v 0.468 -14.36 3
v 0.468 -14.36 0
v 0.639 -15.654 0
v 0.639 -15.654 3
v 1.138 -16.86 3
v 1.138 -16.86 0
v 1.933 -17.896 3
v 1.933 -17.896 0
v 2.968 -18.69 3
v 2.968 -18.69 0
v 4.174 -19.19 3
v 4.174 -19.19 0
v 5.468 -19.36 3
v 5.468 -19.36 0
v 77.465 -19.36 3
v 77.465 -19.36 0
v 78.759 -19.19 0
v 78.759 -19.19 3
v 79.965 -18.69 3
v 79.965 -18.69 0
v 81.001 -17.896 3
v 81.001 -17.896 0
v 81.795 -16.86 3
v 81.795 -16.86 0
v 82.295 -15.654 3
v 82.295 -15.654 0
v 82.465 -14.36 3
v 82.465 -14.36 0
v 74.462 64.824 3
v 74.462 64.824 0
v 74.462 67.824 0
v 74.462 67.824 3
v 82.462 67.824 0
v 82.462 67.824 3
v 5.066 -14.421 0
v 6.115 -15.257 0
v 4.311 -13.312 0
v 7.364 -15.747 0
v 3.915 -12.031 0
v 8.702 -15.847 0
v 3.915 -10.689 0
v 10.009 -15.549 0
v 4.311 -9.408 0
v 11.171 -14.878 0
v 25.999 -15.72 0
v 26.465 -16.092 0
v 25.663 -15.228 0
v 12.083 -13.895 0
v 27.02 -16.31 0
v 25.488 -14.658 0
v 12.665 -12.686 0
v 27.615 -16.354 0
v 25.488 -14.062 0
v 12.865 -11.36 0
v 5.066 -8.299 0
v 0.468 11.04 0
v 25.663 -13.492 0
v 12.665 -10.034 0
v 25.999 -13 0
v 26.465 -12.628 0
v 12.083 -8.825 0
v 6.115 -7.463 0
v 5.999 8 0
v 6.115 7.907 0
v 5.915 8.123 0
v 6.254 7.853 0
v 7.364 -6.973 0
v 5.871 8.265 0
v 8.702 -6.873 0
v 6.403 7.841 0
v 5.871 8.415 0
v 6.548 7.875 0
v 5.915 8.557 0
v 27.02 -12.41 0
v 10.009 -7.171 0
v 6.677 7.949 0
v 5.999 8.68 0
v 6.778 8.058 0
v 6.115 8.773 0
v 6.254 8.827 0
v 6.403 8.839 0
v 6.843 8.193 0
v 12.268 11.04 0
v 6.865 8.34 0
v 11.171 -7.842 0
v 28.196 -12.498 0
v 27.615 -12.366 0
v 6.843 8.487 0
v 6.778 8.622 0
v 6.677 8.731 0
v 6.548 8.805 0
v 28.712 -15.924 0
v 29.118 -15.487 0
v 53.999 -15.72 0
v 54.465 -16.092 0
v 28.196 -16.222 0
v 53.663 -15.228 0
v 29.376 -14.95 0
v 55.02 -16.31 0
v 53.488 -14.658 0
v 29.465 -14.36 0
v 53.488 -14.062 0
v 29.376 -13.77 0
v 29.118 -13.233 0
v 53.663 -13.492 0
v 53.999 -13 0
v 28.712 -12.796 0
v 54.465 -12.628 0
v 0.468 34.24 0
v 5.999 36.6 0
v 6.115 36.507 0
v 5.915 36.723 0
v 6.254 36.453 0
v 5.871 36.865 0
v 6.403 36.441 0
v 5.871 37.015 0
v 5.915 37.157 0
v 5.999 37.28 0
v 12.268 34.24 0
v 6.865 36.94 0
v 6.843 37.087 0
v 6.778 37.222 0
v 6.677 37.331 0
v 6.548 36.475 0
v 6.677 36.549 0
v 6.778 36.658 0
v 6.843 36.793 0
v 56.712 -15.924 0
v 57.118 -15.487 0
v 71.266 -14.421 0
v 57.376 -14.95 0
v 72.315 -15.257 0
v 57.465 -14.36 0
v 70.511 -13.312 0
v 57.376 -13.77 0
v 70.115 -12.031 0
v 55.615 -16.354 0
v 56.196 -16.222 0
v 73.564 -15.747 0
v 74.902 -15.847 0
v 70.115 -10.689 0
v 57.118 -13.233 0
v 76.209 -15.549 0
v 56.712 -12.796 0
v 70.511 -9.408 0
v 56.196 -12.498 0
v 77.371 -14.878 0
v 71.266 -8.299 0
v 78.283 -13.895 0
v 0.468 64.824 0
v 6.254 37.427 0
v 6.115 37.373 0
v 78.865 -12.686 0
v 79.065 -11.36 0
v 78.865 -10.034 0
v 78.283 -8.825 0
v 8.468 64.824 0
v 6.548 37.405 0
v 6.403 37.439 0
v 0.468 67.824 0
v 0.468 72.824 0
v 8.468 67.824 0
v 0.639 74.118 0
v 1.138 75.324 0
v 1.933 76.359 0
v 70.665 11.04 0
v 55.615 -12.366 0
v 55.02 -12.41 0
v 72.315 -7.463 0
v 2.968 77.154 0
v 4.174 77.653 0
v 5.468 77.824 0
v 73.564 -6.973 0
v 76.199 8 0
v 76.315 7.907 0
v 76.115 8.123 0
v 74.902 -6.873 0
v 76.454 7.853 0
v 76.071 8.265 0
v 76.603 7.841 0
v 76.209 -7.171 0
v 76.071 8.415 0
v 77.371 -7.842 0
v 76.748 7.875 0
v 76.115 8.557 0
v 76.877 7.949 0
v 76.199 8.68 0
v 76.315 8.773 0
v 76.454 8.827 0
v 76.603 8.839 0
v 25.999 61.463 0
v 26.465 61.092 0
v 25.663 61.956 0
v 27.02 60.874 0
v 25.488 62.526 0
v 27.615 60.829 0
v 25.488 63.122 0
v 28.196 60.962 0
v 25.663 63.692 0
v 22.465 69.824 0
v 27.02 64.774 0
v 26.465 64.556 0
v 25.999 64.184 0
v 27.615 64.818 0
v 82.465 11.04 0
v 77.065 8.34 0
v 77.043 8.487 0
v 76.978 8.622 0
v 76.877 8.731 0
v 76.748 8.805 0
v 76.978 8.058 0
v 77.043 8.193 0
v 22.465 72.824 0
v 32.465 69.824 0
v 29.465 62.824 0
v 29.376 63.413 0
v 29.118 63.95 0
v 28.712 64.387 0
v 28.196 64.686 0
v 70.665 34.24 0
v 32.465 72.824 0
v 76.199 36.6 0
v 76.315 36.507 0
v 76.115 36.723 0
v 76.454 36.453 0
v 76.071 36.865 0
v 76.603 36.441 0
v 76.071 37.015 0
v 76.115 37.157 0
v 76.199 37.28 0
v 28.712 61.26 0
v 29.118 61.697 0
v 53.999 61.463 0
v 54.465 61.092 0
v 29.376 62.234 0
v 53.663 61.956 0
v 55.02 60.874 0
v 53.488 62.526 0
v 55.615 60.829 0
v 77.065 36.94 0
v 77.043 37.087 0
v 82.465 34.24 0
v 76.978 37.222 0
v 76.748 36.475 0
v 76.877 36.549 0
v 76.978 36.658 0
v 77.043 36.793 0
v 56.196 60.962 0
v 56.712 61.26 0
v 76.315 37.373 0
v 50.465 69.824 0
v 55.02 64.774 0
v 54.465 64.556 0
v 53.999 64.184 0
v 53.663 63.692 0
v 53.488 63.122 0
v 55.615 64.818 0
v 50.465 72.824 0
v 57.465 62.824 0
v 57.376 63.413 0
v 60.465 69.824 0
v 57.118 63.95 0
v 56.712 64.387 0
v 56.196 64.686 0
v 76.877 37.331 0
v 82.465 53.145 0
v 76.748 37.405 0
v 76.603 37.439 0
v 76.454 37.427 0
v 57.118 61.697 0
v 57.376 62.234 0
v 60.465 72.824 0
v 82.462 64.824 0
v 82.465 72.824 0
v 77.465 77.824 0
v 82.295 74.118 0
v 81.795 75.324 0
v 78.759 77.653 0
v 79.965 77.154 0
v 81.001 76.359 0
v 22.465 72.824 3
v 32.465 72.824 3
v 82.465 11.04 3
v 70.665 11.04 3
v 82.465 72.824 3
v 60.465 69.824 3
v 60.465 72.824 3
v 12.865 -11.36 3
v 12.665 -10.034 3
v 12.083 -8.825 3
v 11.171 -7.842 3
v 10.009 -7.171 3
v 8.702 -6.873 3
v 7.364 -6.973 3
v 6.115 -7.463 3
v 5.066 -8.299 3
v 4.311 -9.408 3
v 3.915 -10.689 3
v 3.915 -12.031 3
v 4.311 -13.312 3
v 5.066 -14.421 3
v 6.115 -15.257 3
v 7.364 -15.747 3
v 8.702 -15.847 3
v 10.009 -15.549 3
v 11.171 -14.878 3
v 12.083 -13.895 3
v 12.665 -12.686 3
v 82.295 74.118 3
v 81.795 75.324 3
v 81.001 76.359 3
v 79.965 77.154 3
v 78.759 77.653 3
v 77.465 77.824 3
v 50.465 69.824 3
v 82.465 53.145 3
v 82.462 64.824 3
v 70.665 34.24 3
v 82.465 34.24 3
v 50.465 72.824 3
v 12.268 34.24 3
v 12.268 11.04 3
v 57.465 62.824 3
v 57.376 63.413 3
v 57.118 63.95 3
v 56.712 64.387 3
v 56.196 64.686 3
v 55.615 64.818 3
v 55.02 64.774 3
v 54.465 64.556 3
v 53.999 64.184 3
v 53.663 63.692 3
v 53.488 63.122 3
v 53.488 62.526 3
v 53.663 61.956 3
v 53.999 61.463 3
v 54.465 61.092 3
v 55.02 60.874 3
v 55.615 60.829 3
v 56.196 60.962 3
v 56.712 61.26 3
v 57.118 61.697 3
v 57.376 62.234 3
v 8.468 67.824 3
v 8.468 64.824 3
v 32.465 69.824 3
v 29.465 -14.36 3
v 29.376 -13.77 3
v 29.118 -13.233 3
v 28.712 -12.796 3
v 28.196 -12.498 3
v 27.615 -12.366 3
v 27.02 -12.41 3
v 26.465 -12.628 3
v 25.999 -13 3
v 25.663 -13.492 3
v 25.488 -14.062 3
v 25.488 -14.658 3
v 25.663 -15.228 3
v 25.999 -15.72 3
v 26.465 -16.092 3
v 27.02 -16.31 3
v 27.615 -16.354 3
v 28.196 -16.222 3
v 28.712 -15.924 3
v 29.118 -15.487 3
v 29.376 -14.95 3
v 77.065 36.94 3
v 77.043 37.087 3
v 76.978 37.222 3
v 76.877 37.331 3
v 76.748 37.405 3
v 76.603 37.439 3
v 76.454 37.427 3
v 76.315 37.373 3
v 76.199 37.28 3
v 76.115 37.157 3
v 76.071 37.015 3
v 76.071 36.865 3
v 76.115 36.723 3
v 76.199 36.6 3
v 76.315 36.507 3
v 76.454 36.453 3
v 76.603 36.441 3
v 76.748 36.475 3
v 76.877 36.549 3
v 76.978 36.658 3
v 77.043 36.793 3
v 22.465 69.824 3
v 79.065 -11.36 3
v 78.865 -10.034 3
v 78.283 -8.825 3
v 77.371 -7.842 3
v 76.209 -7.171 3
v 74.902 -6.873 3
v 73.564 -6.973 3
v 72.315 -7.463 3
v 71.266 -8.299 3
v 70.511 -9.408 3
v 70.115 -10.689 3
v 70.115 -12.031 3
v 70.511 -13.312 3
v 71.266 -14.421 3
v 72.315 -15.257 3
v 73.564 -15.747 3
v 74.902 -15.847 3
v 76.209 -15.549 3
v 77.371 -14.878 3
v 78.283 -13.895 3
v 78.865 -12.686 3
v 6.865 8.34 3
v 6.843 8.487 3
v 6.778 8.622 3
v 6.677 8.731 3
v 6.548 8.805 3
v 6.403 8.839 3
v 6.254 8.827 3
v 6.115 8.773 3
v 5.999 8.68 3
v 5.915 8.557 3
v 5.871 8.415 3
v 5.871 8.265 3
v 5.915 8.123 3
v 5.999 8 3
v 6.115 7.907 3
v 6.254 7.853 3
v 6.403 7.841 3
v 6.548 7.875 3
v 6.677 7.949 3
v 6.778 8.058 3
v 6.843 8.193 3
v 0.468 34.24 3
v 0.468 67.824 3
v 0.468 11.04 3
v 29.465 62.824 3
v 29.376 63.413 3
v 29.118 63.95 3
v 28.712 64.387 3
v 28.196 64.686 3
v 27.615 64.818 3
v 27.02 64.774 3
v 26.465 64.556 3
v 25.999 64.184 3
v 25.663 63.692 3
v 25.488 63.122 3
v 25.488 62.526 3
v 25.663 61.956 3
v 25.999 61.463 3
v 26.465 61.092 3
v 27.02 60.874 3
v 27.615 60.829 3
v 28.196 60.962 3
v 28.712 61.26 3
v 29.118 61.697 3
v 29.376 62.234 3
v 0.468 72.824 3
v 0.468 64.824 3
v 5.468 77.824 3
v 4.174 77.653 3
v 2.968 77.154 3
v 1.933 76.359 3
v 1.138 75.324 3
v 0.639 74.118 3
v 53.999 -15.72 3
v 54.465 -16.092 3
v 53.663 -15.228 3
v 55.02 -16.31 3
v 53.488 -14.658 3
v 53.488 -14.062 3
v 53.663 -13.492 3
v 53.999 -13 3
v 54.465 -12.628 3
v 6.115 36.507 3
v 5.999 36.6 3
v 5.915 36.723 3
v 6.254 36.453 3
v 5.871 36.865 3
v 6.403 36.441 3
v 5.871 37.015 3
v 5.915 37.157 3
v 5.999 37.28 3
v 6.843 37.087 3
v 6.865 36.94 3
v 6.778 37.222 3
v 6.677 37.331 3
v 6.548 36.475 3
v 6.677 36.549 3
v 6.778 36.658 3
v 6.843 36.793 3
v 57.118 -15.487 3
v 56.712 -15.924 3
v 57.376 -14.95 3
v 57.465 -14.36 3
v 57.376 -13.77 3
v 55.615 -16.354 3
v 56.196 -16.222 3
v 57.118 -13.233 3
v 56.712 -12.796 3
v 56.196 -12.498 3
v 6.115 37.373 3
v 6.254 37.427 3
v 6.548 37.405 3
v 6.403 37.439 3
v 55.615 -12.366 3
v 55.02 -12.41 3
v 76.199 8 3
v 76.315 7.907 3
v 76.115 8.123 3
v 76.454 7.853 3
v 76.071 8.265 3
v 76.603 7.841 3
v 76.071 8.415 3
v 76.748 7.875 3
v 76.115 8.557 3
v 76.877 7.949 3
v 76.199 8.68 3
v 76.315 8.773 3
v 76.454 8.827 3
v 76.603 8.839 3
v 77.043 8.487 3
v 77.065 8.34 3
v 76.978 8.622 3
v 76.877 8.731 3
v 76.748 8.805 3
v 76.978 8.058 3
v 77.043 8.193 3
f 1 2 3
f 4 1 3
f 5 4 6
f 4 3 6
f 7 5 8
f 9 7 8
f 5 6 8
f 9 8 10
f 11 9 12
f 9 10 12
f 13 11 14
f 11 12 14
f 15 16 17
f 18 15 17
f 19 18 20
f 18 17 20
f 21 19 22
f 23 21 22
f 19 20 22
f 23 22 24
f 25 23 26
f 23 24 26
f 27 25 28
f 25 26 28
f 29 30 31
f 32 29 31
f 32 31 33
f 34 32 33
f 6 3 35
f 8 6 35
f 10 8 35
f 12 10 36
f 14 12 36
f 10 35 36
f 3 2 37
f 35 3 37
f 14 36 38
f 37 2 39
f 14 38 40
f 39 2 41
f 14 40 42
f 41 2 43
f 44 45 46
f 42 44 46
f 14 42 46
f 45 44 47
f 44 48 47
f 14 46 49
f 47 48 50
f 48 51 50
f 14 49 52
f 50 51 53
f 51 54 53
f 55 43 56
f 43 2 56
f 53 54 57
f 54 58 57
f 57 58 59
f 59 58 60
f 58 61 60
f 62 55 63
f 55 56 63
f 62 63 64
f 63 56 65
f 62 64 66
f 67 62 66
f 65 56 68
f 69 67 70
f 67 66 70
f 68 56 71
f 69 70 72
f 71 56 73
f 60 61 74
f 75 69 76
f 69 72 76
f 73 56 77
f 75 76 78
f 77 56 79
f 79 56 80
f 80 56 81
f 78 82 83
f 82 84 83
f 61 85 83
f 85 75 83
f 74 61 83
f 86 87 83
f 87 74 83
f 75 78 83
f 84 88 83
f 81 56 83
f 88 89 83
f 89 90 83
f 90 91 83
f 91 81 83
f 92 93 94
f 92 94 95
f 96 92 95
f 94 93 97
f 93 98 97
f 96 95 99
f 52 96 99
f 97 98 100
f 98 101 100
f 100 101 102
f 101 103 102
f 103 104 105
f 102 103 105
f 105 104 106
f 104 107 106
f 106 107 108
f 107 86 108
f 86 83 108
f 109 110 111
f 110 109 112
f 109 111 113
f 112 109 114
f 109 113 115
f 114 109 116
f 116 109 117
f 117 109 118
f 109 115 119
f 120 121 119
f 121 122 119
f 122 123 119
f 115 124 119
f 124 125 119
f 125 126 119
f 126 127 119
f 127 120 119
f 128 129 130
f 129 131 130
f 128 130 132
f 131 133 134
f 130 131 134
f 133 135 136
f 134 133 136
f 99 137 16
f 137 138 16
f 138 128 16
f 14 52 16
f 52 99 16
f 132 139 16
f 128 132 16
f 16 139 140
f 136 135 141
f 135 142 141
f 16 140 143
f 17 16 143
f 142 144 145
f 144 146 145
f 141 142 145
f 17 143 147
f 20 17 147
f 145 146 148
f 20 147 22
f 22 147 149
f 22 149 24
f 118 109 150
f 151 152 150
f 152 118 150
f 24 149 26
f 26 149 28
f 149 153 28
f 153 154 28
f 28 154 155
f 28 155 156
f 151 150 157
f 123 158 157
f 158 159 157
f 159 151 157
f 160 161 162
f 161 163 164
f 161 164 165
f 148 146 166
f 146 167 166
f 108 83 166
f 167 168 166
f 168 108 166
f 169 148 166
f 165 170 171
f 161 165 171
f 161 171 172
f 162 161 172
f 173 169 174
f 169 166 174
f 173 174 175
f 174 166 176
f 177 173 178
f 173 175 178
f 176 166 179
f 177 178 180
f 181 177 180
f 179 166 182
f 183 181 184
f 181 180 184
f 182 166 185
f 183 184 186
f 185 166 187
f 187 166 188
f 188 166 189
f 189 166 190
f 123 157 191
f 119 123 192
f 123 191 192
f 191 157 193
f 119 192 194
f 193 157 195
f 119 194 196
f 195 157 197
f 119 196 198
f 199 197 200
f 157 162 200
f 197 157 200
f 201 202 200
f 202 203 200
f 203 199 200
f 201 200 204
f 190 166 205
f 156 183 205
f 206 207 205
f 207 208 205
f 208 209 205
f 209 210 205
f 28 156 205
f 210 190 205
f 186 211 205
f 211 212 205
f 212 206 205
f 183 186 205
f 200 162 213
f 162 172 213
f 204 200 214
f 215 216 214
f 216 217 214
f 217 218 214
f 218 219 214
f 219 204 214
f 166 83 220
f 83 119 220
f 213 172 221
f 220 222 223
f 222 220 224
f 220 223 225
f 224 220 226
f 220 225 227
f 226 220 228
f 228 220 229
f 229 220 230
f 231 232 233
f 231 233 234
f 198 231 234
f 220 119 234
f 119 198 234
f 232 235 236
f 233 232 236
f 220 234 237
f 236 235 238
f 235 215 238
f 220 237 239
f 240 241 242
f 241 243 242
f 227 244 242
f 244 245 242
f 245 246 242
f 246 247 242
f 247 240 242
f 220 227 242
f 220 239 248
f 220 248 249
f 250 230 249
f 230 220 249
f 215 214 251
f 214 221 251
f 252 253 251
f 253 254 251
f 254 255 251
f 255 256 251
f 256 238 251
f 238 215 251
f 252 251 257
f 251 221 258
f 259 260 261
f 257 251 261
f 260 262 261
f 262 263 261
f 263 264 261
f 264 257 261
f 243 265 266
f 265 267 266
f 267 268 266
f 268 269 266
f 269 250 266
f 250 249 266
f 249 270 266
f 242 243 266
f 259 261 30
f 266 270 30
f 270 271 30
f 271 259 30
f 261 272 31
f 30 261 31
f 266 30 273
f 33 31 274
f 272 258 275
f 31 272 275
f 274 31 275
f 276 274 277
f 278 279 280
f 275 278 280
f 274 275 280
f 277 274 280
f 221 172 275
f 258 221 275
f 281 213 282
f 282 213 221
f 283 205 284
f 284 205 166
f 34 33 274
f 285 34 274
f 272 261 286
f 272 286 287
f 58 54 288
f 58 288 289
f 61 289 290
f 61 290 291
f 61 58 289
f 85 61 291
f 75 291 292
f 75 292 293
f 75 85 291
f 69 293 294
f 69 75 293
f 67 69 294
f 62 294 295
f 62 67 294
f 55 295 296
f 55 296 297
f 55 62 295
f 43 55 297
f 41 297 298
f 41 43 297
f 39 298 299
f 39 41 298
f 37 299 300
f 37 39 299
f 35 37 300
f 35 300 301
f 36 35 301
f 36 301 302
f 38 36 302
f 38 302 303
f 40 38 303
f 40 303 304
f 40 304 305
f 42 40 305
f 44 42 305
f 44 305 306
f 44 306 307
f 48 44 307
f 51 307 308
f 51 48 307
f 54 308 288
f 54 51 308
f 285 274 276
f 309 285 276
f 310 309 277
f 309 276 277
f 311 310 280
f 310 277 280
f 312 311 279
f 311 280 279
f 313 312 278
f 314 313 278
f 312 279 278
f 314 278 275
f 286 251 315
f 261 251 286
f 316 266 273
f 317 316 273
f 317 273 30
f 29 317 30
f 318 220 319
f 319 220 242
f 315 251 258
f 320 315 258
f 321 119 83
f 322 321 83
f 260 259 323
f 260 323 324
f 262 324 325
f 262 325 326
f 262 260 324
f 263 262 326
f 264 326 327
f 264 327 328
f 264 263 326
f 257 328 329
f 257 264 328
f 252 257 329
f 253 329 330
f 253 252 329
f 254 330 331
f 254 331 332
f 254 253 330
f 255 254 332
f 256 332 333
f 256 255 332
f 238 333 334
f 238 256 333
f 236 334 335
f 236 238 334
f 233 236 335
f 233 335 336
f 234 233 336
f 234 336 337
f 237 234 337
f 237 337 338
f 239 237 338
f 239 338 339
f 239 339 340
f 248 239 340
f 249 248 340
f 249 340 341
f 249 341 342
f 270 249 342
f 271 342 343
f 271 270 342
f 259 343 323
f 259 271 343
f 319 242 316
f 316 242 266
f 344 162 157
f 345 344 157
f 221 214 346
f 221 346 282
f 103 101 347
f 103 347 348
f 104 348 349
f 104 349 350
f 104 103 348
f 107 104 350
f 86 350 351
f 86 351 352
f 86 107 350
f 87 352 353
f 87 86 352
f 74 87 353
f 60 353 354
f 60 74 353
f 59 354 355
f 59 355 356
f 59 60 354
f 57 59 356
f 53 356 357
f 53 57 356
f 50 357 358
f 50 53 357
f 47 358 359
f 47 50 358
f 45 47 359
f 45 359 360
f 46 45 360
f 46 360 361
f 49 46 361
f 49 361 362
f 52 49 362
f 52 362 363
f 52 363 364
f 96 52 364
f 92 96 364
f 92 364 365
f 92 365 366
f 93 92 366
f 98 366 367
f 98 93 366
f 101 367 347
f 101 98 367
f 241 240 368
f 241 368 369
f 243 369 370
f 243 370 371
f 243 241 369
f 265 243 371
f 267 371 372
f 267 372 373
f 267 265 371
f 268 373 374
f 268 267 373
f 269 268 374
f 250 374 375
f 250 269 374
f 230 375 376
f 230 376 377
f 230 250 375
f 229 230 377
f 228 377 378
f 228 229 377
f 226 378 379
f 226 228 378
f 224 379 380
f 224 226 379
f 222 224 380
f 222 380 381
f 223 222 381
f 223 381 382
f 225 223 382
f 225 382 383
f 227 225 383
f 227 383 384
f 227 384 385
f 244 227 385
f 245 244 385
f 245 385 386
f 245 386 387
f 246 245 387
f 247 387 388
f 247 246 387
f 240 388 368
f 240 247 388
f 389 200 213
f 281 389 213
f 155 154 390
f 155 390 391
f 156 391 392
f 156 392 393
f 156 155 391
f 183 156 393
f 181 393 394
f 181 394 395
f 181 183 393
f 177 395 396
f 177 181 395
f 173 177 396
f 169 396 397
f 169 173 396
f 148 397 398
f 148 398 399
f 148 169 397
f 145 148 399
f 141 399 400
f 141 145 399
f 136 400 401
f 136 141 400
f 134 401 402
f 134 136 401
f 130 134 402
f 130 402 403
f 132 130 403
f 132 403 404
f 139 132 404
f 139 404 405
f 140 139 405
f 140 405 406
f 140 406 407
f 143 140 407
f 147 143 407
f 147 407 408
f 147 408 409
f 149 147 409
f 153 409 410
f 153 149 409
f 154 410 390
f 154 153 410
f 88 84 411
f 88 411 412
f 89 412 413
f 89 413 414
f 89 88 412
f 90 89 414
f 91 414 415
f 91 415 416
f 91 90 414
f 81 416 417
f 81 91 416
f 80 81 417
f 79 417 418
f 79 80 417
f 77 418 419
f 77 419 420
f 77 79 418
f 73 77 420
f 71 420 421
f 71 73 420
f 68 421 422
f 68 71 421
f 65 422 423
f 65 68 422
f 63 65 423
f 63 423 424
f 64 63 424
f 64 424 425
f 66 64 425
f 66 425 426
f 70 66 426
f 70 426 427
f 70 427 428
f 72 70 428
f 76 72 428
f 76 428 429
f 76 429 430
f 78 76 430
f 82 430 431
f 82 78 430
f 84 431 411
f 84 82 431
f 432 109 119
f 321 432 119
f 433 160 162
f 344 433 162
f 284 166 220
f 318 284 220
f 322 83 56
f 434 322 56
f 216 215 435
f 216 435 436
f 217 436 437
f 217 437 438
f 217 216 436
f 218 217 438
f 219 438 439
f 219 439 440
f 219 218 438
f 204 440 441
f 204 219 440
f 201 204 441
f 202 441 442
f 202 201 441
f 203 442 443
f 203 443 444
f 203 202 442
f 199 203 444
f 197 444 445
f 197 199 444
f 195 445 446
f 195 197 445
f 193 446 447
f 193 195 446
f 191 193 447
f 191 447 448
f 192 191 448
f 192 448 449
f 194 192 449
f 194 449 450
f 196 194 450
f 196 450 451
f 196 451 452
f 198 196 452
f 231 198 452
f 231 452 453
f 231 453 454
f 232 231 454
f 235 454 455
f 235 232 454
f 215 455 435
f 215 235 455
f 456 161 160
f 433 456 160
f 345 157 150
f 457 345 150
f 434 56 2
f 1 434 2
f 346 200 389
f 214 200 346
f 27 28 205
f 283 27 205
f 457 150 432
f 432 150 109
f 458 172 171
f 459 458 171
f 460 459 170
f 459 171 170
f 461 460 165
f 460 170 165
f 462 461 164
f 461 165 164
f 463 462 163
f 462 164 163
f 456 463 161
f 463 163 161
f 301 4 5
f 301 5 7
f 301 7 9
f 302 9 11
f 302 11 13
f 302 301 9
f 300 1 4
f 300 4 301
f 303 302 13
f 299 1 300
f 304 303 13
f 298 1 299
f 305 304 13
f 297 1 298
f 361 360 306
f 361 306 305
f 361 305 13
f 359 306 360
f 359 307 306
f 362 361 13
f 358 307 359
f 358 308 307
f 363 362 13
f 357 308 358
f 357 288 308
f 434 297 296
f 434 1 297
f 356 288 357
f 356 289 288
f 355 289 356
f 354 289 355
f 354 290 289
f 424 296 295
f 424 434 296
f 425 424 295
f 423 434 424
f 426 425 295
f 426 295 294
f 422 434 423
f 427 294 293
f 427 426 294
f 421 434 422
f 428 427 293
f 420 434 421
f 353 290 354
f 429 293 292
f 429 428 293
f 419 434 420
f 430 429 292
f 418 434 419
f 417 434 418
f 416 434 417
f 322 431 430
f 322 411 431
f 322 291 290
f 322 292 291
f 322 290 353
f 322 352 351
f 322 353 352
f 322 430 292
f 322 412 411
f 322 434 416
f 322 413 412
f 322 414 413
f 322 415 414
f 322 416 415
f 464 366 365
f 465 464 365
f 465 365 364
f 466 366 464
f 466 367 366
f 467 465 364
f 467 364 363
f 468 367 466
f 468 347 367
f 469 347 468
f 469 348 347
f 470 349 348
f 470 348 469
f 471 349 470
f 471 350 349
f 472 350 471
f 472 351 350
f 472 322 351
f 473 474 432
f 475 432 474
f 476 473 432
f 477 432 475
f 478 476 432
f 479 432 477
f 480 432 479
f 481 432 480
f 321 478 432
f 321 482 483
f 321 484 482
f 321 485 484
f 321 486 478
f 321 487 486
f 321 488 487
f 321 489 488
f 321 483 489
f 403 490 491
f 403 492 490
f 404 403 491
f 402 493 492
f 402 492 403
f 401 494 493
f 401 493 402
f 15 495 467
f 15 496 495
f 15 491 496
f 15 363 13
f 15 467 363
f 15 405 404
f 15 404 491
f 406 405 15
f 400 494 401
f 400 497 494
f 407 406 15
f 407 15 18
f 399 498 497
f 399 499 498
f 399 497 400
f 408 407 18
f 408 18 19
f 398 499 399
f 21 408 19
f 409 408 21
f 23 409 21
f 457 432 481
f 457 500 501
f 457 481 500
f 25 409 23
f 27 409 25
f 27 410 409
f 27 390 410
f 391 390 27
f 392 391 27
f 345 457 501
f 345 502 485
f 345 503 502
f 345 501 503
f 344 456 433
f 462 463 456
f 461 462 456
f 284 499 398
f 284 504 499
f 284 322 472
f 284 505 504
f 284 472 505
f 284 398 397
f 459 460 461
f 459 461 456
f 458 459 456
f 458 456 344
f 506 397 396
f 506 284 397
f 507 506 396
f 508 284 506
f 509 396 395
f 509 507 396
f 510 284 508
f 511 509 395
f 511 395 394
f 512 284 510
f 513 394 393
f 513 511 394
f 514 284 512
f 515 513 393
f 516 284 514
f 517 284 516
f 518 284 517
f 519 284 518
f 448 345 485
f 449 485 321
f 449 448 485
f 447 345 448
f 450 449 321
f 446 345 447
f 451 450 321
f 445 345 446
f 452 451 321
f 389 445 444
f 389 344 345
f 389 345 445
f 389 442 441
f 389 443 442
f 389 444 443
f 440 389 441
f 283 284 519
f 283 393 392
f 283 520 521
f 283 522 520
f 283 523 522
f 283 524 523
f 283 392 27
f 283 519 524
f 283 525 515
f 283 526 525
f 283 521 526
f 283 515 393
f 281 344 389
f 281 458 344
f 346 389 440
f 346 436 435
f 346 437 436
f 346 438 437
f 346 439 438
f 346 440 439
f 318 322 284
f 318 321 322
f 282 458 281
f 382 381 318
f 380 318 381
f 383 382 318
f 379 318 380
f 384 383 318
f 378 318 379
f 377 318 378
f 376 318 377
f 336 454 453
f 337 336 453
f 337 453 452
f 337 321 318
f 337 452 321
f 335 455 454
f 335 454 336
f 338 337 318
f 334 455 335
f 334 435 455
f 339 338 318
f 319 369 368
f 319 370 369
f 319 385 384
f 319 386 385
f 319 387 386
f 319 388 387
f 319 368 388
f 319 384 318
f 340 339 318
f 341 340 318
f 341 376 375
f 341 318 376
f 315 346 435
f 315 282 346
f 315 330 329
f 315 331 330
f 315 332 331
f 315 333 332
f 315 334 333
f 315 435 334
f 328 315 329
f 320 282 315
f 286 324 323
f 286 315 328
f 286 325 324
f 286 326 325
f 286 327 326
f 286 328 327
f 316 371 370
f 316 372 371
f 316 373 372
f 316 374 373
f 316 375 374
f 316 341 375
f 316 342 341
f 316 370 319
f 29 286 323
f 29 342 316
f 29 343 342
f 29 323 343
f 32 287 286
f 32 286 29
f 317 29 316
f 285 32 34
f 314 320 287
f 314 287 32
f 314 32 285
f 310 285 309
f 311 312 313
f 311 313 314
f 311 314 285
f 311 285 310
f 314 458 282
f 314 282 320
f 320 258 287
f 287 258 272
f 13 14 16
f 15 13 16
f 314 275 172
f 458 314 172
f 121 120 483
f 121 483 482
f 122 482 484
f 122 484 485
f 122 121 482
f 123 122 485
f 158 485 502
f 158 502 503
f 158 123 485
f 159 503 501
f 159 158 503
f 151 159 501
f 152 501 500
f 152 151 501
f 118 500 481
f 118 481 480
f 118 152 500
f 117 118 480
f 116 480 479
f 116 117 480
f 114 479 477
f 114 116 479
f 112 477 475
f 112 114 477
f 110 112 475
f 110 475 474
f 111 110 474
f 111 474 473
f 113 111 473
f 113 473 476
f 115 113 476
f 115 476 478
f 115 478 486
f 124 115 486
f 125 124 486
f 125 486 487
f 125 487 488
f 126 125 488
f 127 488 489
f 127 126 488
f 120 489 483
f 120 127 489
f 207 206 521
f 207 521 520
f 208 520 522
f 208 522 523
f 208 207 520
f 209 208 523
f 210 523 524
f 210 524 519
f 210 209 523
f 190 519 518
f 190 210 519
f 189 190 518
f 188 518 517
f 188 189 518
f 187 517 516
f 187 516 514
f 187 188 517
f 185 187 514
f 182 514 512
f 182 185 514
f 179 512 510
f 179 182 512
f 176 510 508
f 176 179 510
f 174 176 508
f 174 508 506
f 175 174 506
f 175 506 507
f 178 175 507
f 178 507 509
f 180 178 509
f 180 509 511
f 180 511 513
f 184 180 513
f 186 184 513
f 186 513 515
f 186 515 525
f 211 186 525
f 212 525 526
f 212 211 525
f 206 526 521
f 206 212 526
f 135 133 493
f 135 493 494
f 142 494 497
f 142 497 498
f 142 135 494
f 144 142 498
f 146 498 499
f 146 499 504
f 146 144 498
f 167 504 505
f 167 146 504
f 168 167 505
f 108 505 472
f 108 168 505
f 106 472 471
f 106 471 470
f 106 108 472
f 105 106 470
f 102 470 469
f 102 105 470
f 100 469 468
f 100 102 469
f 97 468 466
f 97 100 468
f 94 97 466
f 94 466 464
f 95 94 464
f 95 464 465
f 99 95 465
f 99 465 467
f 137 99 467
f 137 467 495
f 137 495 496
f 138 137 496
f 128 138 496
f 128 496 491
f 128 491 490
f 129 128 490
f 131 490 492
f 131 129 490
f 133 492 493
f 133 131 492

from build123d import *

# Parameters (mm, degrees)
MODEL_R                 = 2
MODEL_R_2               = 4.5
MODEL_R_3               = 0.5
MODEL_W                 = 10
MODEL_H                 = 3
SALIENTE_EXTRUIR1_DEPTH = 3


with BuildPart() as part:
    # Model → Saliente-Extruir1 (new body)
    with BuildSketch(Plane.XY):
        with BuildLine():
            Line((0.468281908, 11.04000444), (0.468281908, -14.359995173))
            ThreePointArc((0.468281908, -14.359995173), (1.932748002, -17.895529078), (5.468281908, -19.359995173))
            Line((5.468281908, -19.359995173), (77.465215563, -19.35999556))
            ThreePointArc((77.465215563, -19.35999556), (81.000749469, -17.895529466), (82.465215563, -14.35999556))
            Line((82.465215563, -14.35999556), (82.465215563, -9.05498571))
            Line((82.465215563, -9.05498571), (82.465215563, 11.04000444))
            Line((82.465215563, 11.04000444), (70.665215563, 11.04000444))
            Line((70.665215563, 11.04000444), (70.665215563, 34.24000444))
            Line((70.665215563, 34.24000444), (82.465215563, 34.24000444))
            Line((82.465215563, 34.24000444), (82.465215563, 53.145358109))
            Line((82.465215563, 53.145358109), (82.462149219, 64.823793593))
            Line((82.462149219, 64.823793593), (74.462149219, 64.823793593))
            Line((74.462149219, 64.823793593), (74.462149219, 67.823793593))
            Line((74.462149219, 67.823793593), (82.462149219, 67.823793593))
            Line((82.462149219, 67.823793593), (82.465215563, 72.823793593))
            ThreePointArc((82.465215563, 72.823793593), (81.000749469, 76.359327499), (77.465215563, 77.823793593))
            Line((77.465215563, 77.823793593), (67.948183059, 77.823793593))
            Line((67.948183059, 77.823793593), (45.205743308, 77.823793593))
            Line((45.205743308, 77.823793593), (23.093632519, 77.823793593))
            Line((23.093632519, 77.823793593), (11.942122032, 77.823793593))
            Line((11.942122032, 77.823793593), (5.468281908, 77.823793593))
            ThreePointArc((5.468281908, 77.823793593), (1.932748002, 76.359327499), (0.468281908, 72.823793593))
            Line((0.468281908, 72.823793593), (0.468281908, 67.823793593))
            Line((0.468281908, 67.823793593), (8.468281908, 67.823793593))
            Line((8.468281908, 67.823793593), (8.468281908, 64.823793593))
            Line((8.468281908, 64.823793593), (0.468281908, 64.823793593))
            Line((0.468281908, 64.823793593), (0.468281908, 34.24000444))
            Line((0.468281908, 34.24000444), (12.268281908, 34.24000444))
            Line((12.268281908, 34.24000444), (12.268281908, 11.04000444))
            Line((12.268281908, 11.04000444), (0.468281908, 11.04000444))
        make_face()
        with Locations((55.465215563, 62.823793593)):
            Circle(MODEL_R, mode=Mode.SUBTRACT)
        with Locations((27.465215563, 62.823793593)):
            Circle(MODEL_R, mode=Mode.SUBTRACT)
        with Locations((55.465215563, -14.35999556)):
            Circle(MODEL_R, mode=Mode.SUBTRACT)
        with Locations((27.465215563, -14.35999556)):
            Circle(MODEL_R, mode=Mode.SUBTRACT)
        with Locations((74.565215563, -11.35999556)):
            Circle(MODEL_R_2, mode=Mode.SUBTRACT)
        with Locations((8.365215563, -11.35999556)):
            Circle(MODEL_R_2, mode=Mode.SUBTRACT)
        with Locations((6.365215563, 8.34000444)):
            Circle(MODEL_R_3, mode=Mode.SUBTRACT)
        with Locations((6.365215563, 36.94000444)):
            Circle(MODEL_R_3, mode=Mode.SUBTRACT)
        with Locations((76.565215563, 8.34000444)):
            Circle(MODEL_R_3, mode=Mode.SUBTRACT)
        with Locations((76.565215563, 36.94000444)):
            Circle(MODEL_R_3, mode=Mode.SUBTRACT)
        with Locations((55.465215563, 71.323793593)):
            Rectangle(MODEL_W, MODEL_H, mode=Mode.SUBTRACT)
        with Locations((27.465215563, 71.323793593)):
            Rectangle(MODEL_W, MODEL_H, mode=Mode.SUBTRACT)
    extrude(amount=SALIENTE_EXTRUIR1_DEPTH)


solid = part.part
